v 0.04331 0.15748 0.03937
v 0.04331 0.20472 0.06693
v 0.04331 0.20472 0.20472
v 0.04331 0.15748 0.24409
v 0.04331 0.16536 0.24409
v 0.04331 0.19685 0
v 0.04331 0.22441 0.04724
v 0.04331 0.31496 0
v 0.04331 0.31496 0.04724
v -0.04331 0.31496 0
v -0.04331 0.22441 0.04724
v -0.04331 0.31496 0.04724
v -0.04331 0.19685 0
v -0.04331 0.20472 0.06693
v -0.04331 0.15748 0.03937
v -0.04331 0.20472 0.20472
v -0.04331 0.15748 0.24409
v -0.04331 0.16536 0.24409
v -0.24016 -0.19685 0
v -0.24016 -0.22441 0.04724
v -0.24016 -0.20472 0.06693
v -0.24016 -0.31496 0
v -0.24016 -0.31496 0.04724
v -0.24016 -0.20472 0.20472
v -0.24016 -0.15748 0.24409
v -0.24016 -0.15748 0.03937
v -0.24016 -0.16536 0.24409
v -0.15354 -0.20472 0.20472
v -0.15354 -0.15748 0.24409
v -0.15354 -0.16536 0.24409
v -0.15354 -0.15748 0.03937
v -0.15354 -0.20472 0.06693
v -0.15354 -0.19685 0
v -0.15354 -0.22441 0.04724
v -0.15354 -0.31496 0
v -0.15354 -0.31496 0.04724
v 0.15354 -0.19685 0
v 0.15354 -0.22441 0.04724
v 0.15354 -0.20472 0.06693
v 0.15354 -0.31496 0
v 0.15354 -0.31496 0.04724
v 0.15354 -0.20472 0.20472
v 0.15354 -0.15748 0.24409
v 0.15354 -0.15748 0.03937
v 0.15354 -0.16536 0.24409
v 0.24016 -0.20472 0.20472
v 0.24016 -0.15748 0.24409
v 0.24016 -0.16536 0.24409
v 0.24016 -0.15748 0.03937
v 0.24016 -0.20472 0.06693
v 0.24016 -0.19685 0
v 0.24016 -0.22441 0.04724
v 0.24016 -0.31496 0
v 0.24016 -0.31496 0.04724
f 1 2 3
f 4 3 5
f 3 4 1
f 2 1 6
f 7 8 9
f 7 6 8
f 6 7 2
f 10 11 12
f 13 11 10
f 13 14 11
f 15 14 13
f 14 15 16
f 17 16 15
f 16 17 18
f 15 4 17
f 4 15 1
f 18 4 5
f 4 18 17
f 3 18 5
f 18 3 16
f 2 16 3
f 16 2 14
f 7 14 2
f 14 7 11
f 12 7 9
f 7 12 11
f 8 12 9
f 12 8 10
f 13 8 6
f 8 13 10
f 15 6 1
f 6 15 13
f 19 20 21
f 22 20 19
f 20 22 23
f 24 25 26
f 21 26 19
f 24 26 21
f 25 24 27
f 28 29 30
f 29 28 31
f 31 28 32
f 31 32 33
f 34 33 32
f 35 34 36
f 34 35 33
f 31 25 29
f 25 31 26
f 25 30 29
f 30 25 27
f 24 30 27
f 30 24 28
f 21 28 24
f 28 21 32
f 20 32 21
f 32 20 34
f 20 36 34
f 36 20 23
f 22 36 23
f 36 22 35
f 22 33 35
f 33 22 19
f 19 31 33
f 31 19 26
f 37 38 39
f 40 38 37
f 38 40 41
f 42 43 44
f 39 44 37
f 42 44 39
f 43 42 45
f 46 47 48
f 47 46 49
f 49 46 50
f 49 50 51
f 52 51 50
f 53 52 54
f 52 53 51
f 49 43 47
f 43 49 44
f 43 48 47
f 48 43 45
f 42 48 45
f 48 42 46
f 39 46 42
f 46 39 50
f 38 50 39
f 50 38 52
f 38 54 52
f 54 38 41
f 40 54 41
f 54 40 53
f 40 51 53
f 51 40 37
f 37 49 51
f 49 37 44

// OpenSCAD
// file: defines.scad
/*Dim Min Max Typ*/
A = 0.22; // 0.15 0.30
B = 0.80; // 0.75 0.85
C = 1.60; // 1.45 1.75
D = 0.50;
G = 1.00; // 0.90 1.10
H = 1.60; // 1.50 1.70
J = 0.05; // 0.00 0.10
K = 0.75; // 0.60 0.80
L = 0.22; // 0.10 0.30
M = 0.12; // 0.10 0.20
N = 0.50; // 0.45 0.65 

scale = 1/2.54;
// main file
include <defines.scad>

/*up = A2 / 2 - M/2 + A1;*/
dl = 0.05;

of = (C - B)/2;

module Pin() {
  rotate([90, 0, -90])
  linear_extrude(height = A, center = true)
    polygon([
      [0.0,    0.0],
      [0.0,    M],
      [of-M-dl, M],
      [of-M,    M+dl],
      [of-M,    N+M-dl*2],
      [of-M+dl*2,   N+M],
      [of, N+M],
      /*[L, N],*/
      /*[L,    N],*/
      [of,   dl*2],
      [of-dl*2,   0.0]
    ]);
}


scale(scale) color("Silver") {
  /*translate([0, C/2, 0]) cube([0.1,0.1,0.1], center=true);*/
  translate([0, C/2, 0]) Pin();
  translate([-G/2, -C/2, 0]) rotate([0,0,180]) Pin();
  translate([ G/2, -C/2, 0]) rotate([0,0,180]) Pin();
}
